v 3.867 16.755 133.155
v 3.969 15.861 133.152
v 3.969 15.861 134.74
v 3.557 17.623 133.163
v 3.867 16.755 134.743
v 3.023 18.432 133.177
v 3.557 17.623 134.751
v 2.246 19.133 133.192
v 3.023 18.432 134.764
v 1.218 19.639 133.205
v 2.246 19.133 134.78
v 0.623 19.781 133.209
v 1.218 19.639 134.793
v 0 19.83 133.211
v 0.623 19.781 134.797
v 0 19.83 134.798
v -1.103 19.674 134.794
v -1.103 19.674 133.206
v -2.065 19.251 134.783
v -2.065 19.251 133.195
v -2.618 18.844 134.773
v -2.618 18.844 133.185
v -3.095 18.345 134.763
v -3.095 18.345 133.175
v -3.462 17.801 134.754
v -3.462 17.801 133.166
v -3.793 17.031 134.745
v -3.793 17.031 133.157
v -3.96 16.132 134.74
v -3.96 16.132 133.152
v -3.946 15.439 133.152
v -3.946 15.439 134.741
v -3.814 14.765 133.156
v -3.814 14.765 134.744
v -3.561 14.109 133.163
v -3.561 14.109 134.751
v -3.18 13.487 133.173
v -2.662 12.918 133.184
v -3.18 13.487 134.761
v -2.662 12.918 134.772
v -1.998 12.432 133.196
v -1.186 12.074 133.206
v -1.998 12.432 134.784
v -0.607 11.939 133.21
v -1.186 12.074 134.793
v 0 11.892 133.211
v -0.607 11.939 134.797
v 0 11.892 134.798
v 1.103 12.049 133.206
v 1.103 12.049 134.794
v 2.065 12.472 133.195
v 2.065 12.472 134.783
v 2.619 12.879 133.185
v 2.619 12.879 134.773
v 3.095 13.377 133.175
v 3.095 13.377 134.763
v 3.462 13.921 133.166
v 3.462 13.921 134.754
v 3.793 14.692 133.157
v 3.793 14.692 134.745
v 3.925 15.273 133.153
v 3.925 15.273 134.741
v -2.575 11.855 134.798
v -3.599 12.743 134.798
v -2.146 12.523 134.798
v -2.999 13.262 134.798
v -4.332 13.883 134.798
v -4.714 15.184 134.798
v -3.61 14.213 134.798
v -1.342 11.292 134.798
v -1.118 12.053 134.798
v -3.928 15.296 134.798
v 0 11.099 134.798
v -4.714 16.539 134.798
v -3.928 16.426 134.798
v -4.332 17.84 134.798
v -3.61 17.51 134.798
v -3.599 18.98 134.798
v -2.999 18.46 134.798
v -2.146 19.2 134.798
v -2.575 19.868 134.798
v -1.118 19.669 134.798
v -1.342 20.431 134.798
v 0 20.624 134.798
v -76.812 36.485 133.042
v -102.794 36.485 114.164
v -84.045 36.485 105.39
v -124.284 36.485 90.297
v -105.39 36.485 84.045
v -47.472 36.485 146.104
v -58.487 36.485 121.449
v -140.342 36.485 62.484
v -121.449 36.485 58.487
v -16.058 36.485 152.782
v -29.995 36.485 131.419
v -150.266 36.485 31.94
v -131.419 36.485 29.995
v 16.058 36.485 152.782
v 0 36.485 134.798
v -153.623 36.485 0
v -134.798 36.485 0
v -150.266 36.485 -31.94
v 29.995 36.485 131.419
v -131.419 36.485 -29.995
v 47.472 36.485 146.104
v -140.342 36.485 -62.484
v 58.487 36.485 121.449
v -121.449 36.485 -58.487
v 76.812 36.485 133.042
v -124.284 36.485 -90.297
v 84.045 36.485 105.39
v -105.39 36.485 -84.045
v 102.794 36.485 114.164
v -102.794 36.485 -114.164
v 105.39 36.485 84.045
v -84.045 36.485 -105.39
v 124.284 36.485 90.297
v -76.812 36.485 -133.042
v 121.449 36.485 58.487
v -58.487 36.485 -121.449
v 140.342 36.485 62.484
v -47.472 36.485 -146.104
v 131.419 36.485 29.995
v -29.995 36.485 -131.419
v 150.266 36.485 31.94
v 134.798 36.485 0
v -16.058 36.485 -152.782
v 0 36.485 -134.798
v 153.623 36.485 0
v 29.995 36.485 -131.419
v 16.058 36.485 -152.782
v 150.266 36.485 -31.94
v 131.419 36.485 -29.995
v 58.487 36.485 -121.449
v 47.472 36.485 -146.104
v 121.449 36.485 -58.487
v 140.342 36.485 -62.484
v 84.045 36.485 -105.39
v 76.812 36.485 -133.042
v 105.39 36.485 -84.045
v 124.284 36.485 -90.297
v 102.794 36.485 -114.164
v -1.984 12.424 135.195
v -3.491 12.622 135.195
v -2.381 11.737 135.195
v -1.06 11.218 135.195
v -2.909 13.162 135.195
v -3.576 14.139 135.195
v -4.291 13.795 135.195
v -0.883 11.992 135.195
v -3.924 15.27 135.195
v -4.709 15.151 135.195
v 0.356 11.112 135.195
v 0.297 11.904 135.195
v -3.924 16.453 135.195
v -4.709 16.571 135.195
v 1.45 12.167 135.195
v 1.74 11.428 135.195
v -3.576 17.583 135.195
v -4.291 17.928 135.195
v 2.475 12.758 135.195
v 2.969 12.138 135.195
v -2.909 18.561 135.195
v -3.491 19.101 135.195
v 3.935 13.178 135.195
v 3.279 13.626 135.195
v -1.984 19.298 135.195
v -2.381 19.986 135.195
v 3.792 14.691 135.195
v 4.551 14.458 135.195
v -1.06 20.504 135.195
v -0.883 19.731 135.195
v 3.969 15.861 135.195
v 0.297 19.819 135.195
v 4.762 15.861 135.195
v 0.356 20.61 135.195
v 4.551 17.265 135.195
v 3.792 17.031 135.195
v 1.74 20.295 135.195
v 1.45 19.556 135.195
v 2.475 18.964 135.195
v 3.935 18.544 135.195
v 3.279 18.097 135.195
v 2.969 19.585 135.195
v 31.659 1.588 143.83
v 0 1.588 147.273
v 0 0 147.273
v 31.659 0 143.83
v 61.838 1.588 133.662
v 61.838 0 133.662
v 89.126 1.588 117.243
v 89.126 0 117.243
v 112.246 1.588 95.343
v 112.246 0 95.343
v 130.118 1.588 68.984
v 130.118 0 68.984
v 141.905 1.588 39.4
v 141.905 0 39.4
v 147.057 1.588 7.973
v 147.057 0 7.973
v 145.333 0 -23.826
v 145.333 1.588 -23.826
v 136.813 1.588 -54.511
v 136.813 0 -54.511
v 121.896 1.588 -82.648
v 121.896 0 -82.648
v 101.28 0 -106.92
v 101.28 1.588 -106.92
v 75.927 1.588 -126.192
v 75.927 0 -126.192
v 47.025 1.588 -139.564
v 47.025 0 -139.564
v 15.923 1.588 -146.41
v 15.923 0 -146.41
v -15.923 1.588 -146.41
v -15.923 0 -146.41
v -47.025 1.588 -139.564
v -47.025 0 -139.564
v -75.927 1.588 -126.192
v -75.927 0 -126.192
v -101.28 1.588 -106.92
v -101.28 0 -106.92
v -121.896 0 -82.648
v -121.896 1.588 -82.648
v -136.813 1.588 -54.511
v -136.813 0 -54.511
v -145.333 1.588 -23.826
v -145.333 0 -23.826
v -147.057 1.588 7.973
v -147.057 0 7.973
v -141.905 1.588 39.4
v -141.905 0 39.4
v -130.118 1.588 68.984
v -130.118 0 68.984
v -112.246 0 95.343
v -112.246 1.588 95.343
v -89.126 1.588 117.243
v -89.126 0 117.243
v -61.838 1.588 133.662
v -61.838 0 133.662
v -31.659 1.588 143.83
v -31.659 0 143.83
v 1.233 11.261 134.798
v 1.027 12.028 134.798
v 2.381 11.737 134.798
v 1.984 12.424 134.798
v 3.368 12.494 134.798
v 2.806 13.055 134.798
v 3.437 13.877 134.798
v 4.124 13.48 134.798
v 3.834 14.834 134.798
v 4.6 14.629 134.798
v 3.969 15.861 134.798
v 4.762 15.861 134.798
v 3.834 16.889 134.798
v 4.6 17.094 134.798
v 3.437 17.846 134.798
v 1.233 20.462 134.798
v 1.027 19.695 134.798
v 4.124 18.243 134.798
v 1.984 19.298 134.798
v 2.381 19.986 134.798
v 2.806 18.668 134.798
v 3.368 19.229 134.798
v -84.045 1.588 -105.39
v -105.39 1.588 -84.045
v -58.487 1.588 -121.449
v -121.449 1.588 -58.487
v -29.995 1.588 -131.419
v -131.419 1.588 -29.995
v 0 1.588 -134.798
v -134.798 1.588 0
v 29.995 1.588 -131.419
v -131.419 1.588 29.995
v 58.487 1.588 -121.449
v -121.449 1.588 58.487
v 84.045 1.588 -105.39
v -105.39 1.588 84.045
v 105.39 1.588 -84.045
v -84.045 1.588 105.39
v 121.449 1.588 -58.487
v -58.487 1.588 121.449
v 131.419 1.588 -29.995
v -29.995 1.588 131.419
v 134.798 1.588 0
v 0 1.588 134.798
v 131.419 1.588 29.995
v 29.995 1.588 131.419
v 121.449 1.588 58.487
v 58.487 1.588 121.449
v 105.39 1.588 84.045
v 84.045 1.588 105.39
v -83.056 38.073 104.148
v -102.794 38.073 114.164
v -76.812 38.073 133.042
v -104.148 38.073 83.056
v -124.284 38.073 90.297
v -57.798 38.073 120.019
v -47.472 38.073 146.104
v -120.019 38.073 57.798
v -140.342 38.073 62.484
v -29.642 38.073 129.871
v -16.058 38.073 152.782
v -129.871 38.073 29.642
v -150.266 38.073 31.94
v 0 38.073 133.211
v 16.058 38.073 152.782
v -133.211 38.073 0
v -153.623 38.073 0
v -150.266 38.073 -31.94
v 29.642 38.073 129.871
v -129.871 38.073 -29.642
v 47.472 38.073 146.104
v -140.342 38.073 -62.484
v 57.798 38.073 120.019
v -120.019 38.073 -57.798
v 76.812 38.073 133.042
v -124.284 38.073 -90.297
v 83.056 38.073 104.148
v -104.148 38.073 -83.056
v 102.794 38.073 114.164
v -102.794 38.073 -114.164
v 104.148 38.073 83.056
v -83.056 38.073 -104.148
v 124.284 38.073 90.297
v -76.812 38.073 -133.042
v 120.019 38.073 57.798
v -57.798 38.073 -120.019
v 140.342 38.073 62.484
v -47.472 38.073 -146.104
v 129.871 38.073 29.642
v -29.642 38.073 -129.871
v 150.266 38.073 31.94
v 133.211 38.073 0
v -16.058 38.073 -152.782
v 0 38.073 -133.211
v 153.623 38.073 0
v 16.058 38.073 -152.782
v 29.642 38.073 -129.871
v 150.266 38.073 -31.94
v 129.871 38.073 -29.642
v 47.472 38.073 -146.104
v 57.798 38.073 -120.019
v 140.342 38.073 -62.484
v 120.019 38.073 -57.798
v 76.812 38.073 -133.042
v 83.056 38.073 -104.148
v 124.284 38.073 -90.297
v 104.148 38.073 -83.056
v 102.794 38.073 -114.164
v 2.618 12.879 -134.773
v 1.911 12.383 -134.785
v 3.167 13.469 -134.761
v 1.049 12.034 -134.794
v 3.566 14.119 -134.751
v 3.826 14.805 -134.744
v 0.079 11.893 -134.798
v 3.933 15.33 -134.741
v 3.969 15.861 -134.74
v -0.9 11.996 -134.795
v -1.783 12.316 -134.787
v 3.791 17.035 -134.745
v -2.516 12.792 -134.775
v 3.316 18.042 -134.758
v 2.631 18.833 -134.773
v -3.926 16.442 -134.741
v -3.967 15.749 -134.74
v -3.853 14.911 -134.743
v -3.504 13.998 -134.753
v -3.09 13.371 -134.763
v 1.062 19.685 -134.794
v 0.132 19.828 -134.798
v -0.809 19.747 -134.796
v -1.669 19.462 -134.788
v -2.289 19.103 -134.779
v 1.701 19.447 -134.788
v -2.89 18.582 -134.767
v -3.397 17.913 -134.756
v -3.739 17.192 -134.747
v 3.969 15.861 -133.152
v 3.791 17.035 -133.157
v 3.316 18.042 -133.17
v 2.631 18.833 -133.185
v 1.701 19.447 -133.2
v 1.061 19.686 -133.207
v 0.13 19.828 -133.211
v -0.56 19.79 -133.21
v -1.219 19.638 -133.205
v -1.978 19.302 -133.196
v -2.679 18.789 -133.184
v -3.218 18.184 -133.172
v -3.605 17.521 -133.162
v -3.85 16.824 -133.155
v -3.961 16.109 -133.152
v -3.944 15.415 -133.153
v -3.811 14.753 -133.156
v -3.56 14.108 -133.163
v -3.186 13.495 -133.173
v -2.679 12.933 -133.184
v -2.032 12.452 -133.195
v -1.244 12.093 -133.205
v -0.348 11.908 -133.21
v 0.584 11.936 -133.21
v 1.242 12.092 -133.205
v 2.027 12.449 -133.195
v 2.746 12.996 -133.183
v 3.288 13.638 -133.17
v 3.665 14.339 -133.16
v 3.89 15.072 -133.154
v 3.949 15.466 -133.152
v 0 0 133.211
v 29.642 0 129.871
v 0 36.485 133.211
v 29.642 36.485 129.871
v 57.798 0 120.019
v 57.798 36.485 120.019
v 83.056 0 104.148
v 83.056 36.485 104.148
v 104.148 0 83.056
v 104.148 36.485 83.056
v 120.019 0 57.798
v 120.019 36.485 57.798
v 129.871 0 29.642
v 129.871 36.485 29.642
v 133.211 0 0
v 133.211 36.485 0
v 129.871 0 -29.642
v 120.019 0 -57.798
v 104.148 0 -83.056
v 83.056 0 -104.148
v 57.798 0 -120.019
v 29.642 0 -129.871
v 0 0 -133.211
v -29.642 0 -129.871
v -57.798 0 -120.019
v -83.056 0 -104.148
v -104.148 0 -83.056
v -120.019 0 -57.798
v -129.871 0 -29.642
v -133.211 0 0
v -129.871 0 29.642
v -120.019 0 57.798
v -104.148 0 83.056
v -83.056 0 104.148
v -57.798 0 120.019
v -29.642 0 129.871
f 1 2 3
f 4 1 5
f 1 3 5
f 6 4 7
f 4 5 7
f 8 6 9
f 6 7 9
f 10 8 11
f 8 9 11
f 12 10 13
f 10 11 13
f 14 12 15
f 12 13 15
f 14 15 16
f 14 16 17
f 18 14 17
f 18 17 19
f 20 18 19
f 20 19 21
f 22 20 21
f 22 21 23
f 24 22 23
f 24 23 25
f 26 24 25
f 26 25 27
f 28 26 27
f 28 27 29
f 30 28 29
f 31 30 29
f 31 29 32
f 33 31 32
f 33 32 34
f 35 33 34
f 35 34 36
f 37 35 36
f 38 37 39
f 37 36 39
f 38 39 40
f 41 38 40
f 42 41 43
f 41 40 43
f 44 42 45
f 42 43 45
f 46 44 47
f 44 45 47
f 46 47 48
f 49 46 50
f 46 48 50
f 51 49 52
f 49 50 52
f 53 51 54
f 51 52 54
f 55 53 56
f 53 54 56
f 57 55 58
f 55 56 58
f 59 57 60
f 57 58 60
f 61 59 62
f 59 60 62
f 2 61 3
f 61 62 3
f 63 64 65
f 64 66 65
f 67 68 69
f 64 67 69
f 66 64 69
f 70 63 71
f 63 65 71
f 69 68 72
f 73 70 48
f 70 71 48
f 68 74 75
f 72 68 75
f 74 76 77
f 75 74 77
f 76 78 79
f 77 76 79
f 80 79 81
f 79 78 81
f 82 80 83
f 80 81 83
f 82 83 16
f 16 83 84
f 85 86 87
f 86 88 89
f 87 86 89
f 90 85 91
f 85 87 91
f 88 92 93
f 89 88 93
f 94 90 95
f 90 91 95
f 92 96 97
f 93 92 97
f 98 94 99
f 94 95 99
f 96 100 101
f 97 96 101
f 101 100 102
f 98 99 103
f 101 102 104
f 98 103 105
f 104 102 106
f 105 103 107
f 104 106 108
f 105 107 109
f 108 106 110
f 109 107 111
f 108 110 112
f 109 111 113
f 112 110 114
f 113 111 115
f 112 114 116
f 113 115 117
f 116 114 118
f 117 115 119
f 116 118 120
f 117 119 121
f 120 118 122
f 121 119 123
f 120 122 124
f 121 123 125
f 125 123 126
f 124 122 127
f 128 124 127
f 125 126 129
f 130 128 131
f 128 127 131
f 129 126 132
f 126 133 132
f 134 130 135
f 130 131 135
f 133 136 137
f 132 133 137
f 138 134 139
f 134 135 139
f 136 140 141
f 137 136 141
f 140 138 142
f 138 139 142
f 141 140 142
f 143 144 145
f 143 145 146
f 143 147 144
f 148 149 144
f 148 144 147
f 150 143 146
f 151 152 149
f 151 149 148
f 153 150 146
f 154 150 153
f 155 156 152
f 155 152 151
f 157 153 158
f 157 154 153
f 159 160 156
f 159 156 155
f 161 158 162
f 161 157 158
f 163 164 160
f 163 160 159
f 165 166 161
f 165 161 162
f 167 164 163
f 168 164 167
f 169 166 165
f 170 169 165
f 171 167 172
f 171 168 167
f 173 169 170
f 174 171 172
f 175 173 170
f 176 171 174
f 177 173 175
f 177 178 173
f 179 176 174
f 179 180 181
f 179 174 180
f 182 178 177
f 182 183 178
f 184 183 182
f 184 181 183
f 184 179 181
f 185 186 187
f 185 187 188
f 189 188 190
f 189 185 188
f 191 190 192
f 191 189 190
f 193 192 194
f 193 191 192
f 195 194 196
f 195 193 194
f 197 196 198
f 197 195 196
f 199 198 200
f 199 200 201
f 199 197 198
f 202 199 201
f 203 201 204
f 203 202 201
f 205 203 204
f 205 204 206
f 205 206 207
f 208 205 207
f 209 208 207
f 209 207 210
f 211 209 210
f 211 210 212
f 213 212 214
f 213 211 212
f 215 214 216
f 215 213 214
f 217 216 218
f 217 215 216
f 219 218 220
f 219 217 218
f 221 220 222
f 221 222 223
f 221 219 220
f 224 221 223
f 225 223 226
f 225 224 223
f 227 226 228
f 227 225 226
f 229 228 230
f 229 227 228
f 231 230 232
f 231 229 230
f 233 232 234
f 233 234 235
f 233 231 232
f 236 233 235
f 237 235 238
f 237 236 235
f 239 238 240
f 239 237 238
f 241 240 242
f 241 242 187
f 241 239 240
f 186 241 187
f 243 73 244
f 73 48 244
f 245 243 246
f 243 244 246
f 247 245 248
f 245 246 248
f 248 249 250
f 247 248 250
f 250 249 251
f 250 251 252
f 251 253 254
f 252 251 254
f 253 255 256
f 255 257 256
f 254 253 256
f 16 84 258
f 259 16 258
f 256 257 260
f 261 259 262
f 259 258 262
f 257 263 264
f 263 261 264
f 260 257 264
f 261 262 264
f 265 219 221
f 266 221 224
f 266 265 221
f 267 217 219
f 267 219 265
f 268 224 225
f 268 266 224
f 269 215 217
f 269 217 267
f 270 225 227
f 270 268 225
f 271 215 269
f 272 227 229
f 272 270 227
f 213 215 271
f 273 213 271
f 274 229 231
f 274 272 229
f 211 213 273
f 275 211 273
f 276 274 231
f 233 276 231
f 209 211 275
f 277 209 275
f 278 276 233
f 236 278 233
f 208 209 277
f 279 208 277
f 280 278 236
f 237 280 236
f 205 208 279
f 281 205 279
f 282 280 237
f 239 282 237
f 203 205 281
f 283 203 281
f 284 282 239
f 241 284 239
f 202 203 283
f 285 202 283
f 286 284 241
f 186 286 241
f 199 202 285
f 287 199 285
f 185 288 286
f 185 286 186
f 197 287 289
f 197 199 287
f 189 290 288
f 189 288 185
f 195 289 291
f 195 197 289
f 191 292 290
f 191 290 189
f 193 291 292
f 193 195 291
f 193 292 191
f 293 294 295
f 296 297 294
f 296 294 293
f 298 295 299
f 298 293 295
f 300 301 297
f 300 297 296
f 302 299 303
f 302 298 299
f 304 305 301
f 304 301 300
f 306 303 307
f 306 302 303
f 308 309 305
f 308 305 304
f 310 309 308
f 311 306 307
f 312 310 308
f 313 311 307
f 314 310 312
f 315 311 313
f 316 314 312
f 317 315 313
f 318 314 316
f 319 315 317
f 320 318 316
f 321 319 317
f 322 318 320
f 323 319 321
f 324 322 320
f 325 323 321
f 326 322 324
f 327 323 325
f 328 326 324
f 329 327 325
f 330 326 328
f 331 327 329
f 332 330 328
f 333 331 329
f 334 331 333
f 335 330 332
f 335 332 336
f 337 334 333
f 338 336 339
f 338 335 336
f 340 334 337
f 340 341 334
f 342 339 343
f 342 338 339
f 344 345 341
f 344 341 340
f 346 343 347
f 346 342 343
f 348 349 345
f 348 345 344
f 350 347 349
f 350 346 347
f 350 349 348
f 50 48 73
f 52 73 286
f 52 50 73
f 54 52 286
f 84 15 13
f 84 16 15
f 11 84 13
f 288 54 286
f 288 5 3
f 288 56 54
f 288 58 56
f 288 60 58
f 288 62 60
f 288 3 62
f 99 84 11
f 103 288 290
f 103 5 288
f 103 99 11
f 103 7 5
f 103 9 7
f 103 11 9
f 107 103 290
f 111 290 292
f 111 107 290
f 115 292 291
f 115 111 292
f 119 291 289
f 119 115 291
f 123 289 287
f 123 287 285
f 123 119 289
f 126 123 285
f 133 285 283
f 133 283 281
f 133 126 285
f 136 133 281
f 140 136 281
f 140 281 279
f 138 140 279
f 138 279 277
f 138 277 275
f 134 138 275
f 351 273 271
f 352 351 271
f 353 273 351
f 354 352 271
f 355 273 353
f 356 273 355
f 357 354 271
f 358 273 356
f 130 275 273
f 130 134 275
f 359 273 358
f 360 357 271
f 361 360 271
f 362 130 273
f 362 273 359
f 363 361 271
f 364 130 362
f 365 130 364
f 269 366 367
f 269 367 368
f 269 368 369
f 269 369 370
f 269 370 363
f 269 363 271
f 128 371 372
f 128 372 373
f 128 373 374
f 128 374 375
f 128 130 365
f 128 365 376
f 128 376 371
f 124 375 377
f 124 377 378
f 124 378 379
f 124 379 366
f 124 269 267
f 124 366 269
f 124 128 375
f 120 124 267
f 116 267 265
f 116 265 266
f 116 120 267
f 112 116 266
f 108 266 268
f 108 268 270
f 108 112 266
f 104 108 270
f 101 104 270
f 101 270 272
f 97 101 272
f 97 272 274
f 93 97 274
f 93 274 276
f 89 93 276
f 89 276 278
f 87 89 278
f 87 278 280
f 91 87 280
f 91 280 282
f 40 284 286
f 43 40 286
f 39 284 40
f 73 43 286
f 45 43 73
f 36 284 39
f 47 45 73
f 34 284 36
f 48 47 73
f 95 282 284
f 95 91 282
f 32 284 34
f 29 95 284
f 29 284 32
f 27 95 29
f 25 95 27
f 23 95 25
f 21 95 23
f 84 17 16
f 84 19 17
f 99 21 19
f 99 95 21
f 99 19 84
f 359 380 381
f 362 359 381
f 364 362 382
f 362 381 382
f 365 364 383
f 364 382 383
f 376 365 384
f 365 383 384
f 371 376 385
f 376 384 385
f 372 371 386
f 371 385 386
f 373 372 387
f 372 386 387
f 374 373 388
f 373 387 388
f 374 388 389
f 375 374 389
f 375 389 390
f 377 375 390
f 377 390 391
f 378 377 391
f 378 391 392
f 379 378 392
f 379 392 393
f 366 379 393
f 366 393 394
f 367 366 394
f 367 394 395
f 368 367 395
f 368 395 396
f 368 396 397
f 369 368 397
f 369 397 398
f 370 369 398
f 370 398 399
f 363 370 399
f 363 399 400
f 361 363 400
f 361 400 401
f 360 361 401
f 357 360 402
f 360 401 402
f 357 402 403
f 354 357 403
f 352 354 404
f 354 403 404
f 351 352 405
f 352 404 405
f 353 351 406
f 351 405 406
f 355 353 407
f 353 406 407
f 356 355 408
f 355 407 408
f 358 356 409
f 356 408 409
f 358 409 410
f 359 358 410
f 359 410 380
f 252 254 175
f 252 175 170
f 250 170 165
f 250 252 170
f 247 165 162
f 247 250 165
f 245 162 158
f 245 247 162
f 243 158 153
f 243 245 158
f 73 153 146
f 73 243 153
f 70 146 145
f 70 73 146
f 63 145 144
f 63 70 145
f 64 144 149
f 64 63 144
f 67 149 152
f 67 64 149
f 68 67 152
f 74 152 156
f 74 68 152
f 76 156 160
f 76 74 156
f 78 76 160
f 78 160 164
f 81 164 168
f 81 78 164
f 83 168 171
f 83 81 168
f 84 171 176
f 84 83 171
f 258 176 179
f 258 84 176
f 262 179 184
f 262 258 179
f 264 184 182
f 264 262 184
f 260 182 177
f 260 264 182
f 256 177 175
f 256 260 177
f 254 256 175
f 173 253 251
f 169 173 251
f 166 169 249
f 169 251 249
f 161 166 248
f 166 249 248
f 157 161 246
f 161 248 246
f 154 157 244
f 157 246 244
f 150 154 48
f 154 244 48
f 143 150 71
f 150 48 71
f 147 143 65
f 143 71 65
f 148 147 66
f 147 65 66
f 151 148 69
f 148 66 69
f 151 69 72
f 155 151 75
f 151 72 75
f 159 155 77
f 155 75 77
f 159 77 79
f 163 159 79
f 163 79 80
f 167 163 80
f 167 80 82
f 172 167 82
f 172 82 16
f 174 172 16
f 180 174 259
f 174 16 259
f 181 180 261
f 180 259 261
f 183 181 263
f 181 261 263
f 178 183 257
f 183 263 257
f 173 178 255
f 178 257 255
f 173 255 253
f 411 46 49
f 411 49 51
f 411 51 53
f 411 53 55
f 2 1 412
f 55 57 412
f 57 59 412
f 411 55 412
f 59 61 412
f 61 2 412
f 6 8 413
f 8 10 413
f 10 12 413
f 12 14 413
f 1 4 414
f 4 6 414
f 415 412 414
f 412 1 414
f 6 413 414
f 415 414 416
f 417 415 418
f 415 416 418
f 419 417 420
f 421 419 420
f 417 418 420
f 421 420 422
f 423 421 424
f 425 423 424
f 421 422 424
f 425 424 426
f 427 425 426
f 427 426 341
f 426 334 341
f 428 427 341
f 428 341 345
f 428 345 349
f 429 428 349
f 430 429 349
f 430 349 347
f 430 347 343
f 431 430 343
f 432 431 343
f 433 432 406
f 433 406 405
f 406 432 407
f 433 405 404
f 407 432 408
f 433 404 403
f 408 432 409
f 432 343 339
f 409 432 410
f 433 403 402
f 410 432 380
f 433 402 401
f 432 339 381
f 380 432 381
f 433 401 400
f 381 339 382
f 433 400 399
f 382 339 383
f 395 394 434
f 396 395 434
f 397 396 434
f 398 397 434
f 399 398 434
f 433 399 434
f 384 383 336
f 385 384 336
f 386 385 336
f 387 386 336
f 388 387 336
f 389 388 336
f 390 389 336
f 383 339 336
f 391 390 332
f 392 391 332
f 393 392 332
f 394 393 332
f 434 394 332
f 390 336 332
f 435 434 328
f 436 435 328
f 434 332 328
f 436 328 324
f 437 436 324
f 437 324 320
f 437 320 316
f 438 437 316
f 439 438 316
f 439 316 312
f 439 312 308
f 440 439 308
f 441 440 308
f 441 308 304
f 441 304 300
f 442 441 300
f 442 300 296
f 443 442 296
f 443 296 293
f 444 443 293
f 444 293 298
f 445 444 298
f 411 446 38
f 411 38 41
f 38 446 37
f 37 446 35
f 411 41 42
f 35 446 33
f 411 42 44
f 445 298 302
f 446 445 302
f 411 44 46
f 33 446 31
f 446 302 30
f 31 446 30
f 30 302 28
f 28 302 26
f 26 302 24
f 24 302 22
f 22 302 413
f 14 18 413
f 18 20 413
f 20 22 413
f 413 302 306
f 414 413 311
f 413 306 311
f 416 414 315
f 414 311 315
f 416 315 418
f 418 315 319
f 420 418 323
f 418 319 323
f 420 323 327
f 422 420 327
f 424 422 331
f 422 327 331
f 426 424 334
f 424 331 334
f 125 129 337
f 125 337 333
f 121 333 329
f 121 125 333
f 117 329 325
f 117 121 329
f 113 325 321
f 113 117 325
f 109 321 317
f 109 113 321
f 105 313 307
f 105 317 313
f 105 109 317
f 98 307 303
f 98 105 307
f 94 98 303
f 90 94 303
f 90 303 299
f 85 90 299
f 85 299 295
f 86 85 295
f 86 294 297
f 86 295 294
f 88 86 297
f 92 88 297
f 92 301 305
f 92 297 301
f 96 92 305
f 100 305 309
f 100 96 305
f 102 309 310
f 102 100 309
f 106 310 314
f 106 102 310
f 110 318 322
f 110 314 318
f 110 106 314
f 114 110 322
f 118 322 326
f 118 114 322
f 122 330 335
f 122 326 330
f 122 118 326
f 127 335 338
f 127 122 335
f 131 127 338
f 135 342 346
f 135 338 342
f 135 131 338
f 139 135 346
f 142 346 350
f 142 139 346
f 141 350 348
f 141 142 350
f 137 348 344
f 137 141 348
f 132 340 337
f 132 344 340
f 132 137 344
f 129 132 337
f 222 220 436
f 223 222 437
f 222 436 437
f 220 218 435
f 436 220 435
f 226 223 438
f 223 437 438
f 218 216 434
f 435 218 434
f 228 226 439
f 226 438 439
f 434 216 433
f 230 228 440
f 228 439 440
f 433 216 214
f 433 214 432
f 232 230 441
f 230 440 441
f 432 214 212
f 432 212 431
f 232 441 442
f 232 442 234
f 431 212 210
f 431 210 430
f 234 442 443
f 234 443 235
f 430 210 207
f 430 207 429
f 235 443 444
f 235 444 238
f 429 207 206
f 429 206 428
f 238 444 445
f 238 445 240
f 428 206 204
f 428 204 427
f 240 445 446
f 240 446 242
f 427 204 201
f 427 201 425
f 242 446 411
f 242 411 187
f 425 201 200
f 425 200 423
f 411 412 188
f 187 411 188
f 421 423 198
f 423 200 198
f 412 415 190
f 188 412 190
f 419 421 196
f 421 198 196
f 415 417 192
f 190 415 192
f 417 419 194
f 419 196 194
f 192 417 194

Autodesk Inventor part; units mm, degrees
ref_plane "YZ Plane" through (0, 0, 0) normal (1, 0, 0) x (0, 1, 0)
ref_plane "XZ Plane" through (0, 0, 0) normal (0, 1, 0) x (-1, 0, 0)
sketch "Sketch1" plane through (0, 0, 0) normal (1, 0, 0) x (0, 1, 0)
  line L0 (0, 0) -> (28.6807, 0)
  line L1 (0, 133.2109) -> (36.4852, 133.2109)
  line L2 (0, 133.2109) -> (0, 147.2732)
  line L3 (0, 147.2732) -> (1.5875, 147.2732)
  line L4 (1.5875, 134.7984) -> (36.4852, 134.7984)
  line L5 (36.4852, 134.7984) -> (36.4852, 133.2109)
  line L6 (1.5875, 134.7984) -> (1.5875, 147.2732)
  point P0 (15.8613, 134.7984)
  dimension "Lay2Rad" = 133.2109
  dimension "d1" = 14.0623
  dimension "d2" = 1.5875
  dimension "d3" = 36.4852
  dimension "d4" = 1.5875
  dimension "d5" = 1.5875
  dimension "d7" = 14.2738
revolve "Revolution1" add sketch "Sketch1" angle 360 about axis through (0, 0, 0) along (0, 1, 0)
ref_plane "Work Plane1" through (0, 15.8613, 134.7984) normal (0, 0, 1) x (1, 0, 0)
sketch "Sketch2" plane through (0, 15.8613, 134.7984) normal (0, 0, 1) x (1, 0, 0)
  circle A0 centre (0, 0) radius 4.7625
  circle A1 centre (0, 0) radius 3.9688
  point P0 (0, -15.8613)
  dimension "d8" = 9.525
  dimension "d11" = 7.9375
extrude "Extrusion2" cut sketch "Sketch2" against normal through all contours A1
extrude "Extrusion3" add sketch "Sketch2" along normal blind 0.3969
sketch "Sketch3" plane through (0, 36.4852, 0) normal (0, 1, 0) x (1, 0, 0)
  circle A0 centre (0, 0) radius 133.2109
  circle A1 centre (0, 0) radius 133.2109 projected
  circle A2 centre (0, 0) radius 153.6232
  circle A3 centre (0, 0) radius 147.2732 projected
  dimension "d16" = 6.35
extrude "Extrusion4" add sketch "Sketch3" along normal blind 1.5875 contours A2 | A3
equation "\"Lay2Rad\" = -2 * SpWall + 0.5 * IBDia"
equation "\"d2\" = Wall"
equation "\"d3\" = d1_1 + BevDriverDia + SpWall + Space + Wall"
equation "\"d4\" = Wall"
equation "\"d5\" = Wall"
equation "\"d7\" = 1.5 * Space + 0.5 * BevDriverDia"
equation "\"d8\" = 2 * Space + AxelDia"
equation "\"d11\" = AxelDia + Space"
equation "\"d14\" = 0.25 * Wall"
equation "\"d17\" = Wall"
equation "\"SpWall\" = 3.175"
equation "\"IBDia\" = 279.121792"
equation "\"Wall\" = 1.5875"
equation "\"d1_1\" = 6.35"
equation "\"BevDriverDia\" = 23.785175"
equation "\"Space\" = 1.5875"
equation "\"AxelDia\" = 6.35"
properties part number "Layer2"
